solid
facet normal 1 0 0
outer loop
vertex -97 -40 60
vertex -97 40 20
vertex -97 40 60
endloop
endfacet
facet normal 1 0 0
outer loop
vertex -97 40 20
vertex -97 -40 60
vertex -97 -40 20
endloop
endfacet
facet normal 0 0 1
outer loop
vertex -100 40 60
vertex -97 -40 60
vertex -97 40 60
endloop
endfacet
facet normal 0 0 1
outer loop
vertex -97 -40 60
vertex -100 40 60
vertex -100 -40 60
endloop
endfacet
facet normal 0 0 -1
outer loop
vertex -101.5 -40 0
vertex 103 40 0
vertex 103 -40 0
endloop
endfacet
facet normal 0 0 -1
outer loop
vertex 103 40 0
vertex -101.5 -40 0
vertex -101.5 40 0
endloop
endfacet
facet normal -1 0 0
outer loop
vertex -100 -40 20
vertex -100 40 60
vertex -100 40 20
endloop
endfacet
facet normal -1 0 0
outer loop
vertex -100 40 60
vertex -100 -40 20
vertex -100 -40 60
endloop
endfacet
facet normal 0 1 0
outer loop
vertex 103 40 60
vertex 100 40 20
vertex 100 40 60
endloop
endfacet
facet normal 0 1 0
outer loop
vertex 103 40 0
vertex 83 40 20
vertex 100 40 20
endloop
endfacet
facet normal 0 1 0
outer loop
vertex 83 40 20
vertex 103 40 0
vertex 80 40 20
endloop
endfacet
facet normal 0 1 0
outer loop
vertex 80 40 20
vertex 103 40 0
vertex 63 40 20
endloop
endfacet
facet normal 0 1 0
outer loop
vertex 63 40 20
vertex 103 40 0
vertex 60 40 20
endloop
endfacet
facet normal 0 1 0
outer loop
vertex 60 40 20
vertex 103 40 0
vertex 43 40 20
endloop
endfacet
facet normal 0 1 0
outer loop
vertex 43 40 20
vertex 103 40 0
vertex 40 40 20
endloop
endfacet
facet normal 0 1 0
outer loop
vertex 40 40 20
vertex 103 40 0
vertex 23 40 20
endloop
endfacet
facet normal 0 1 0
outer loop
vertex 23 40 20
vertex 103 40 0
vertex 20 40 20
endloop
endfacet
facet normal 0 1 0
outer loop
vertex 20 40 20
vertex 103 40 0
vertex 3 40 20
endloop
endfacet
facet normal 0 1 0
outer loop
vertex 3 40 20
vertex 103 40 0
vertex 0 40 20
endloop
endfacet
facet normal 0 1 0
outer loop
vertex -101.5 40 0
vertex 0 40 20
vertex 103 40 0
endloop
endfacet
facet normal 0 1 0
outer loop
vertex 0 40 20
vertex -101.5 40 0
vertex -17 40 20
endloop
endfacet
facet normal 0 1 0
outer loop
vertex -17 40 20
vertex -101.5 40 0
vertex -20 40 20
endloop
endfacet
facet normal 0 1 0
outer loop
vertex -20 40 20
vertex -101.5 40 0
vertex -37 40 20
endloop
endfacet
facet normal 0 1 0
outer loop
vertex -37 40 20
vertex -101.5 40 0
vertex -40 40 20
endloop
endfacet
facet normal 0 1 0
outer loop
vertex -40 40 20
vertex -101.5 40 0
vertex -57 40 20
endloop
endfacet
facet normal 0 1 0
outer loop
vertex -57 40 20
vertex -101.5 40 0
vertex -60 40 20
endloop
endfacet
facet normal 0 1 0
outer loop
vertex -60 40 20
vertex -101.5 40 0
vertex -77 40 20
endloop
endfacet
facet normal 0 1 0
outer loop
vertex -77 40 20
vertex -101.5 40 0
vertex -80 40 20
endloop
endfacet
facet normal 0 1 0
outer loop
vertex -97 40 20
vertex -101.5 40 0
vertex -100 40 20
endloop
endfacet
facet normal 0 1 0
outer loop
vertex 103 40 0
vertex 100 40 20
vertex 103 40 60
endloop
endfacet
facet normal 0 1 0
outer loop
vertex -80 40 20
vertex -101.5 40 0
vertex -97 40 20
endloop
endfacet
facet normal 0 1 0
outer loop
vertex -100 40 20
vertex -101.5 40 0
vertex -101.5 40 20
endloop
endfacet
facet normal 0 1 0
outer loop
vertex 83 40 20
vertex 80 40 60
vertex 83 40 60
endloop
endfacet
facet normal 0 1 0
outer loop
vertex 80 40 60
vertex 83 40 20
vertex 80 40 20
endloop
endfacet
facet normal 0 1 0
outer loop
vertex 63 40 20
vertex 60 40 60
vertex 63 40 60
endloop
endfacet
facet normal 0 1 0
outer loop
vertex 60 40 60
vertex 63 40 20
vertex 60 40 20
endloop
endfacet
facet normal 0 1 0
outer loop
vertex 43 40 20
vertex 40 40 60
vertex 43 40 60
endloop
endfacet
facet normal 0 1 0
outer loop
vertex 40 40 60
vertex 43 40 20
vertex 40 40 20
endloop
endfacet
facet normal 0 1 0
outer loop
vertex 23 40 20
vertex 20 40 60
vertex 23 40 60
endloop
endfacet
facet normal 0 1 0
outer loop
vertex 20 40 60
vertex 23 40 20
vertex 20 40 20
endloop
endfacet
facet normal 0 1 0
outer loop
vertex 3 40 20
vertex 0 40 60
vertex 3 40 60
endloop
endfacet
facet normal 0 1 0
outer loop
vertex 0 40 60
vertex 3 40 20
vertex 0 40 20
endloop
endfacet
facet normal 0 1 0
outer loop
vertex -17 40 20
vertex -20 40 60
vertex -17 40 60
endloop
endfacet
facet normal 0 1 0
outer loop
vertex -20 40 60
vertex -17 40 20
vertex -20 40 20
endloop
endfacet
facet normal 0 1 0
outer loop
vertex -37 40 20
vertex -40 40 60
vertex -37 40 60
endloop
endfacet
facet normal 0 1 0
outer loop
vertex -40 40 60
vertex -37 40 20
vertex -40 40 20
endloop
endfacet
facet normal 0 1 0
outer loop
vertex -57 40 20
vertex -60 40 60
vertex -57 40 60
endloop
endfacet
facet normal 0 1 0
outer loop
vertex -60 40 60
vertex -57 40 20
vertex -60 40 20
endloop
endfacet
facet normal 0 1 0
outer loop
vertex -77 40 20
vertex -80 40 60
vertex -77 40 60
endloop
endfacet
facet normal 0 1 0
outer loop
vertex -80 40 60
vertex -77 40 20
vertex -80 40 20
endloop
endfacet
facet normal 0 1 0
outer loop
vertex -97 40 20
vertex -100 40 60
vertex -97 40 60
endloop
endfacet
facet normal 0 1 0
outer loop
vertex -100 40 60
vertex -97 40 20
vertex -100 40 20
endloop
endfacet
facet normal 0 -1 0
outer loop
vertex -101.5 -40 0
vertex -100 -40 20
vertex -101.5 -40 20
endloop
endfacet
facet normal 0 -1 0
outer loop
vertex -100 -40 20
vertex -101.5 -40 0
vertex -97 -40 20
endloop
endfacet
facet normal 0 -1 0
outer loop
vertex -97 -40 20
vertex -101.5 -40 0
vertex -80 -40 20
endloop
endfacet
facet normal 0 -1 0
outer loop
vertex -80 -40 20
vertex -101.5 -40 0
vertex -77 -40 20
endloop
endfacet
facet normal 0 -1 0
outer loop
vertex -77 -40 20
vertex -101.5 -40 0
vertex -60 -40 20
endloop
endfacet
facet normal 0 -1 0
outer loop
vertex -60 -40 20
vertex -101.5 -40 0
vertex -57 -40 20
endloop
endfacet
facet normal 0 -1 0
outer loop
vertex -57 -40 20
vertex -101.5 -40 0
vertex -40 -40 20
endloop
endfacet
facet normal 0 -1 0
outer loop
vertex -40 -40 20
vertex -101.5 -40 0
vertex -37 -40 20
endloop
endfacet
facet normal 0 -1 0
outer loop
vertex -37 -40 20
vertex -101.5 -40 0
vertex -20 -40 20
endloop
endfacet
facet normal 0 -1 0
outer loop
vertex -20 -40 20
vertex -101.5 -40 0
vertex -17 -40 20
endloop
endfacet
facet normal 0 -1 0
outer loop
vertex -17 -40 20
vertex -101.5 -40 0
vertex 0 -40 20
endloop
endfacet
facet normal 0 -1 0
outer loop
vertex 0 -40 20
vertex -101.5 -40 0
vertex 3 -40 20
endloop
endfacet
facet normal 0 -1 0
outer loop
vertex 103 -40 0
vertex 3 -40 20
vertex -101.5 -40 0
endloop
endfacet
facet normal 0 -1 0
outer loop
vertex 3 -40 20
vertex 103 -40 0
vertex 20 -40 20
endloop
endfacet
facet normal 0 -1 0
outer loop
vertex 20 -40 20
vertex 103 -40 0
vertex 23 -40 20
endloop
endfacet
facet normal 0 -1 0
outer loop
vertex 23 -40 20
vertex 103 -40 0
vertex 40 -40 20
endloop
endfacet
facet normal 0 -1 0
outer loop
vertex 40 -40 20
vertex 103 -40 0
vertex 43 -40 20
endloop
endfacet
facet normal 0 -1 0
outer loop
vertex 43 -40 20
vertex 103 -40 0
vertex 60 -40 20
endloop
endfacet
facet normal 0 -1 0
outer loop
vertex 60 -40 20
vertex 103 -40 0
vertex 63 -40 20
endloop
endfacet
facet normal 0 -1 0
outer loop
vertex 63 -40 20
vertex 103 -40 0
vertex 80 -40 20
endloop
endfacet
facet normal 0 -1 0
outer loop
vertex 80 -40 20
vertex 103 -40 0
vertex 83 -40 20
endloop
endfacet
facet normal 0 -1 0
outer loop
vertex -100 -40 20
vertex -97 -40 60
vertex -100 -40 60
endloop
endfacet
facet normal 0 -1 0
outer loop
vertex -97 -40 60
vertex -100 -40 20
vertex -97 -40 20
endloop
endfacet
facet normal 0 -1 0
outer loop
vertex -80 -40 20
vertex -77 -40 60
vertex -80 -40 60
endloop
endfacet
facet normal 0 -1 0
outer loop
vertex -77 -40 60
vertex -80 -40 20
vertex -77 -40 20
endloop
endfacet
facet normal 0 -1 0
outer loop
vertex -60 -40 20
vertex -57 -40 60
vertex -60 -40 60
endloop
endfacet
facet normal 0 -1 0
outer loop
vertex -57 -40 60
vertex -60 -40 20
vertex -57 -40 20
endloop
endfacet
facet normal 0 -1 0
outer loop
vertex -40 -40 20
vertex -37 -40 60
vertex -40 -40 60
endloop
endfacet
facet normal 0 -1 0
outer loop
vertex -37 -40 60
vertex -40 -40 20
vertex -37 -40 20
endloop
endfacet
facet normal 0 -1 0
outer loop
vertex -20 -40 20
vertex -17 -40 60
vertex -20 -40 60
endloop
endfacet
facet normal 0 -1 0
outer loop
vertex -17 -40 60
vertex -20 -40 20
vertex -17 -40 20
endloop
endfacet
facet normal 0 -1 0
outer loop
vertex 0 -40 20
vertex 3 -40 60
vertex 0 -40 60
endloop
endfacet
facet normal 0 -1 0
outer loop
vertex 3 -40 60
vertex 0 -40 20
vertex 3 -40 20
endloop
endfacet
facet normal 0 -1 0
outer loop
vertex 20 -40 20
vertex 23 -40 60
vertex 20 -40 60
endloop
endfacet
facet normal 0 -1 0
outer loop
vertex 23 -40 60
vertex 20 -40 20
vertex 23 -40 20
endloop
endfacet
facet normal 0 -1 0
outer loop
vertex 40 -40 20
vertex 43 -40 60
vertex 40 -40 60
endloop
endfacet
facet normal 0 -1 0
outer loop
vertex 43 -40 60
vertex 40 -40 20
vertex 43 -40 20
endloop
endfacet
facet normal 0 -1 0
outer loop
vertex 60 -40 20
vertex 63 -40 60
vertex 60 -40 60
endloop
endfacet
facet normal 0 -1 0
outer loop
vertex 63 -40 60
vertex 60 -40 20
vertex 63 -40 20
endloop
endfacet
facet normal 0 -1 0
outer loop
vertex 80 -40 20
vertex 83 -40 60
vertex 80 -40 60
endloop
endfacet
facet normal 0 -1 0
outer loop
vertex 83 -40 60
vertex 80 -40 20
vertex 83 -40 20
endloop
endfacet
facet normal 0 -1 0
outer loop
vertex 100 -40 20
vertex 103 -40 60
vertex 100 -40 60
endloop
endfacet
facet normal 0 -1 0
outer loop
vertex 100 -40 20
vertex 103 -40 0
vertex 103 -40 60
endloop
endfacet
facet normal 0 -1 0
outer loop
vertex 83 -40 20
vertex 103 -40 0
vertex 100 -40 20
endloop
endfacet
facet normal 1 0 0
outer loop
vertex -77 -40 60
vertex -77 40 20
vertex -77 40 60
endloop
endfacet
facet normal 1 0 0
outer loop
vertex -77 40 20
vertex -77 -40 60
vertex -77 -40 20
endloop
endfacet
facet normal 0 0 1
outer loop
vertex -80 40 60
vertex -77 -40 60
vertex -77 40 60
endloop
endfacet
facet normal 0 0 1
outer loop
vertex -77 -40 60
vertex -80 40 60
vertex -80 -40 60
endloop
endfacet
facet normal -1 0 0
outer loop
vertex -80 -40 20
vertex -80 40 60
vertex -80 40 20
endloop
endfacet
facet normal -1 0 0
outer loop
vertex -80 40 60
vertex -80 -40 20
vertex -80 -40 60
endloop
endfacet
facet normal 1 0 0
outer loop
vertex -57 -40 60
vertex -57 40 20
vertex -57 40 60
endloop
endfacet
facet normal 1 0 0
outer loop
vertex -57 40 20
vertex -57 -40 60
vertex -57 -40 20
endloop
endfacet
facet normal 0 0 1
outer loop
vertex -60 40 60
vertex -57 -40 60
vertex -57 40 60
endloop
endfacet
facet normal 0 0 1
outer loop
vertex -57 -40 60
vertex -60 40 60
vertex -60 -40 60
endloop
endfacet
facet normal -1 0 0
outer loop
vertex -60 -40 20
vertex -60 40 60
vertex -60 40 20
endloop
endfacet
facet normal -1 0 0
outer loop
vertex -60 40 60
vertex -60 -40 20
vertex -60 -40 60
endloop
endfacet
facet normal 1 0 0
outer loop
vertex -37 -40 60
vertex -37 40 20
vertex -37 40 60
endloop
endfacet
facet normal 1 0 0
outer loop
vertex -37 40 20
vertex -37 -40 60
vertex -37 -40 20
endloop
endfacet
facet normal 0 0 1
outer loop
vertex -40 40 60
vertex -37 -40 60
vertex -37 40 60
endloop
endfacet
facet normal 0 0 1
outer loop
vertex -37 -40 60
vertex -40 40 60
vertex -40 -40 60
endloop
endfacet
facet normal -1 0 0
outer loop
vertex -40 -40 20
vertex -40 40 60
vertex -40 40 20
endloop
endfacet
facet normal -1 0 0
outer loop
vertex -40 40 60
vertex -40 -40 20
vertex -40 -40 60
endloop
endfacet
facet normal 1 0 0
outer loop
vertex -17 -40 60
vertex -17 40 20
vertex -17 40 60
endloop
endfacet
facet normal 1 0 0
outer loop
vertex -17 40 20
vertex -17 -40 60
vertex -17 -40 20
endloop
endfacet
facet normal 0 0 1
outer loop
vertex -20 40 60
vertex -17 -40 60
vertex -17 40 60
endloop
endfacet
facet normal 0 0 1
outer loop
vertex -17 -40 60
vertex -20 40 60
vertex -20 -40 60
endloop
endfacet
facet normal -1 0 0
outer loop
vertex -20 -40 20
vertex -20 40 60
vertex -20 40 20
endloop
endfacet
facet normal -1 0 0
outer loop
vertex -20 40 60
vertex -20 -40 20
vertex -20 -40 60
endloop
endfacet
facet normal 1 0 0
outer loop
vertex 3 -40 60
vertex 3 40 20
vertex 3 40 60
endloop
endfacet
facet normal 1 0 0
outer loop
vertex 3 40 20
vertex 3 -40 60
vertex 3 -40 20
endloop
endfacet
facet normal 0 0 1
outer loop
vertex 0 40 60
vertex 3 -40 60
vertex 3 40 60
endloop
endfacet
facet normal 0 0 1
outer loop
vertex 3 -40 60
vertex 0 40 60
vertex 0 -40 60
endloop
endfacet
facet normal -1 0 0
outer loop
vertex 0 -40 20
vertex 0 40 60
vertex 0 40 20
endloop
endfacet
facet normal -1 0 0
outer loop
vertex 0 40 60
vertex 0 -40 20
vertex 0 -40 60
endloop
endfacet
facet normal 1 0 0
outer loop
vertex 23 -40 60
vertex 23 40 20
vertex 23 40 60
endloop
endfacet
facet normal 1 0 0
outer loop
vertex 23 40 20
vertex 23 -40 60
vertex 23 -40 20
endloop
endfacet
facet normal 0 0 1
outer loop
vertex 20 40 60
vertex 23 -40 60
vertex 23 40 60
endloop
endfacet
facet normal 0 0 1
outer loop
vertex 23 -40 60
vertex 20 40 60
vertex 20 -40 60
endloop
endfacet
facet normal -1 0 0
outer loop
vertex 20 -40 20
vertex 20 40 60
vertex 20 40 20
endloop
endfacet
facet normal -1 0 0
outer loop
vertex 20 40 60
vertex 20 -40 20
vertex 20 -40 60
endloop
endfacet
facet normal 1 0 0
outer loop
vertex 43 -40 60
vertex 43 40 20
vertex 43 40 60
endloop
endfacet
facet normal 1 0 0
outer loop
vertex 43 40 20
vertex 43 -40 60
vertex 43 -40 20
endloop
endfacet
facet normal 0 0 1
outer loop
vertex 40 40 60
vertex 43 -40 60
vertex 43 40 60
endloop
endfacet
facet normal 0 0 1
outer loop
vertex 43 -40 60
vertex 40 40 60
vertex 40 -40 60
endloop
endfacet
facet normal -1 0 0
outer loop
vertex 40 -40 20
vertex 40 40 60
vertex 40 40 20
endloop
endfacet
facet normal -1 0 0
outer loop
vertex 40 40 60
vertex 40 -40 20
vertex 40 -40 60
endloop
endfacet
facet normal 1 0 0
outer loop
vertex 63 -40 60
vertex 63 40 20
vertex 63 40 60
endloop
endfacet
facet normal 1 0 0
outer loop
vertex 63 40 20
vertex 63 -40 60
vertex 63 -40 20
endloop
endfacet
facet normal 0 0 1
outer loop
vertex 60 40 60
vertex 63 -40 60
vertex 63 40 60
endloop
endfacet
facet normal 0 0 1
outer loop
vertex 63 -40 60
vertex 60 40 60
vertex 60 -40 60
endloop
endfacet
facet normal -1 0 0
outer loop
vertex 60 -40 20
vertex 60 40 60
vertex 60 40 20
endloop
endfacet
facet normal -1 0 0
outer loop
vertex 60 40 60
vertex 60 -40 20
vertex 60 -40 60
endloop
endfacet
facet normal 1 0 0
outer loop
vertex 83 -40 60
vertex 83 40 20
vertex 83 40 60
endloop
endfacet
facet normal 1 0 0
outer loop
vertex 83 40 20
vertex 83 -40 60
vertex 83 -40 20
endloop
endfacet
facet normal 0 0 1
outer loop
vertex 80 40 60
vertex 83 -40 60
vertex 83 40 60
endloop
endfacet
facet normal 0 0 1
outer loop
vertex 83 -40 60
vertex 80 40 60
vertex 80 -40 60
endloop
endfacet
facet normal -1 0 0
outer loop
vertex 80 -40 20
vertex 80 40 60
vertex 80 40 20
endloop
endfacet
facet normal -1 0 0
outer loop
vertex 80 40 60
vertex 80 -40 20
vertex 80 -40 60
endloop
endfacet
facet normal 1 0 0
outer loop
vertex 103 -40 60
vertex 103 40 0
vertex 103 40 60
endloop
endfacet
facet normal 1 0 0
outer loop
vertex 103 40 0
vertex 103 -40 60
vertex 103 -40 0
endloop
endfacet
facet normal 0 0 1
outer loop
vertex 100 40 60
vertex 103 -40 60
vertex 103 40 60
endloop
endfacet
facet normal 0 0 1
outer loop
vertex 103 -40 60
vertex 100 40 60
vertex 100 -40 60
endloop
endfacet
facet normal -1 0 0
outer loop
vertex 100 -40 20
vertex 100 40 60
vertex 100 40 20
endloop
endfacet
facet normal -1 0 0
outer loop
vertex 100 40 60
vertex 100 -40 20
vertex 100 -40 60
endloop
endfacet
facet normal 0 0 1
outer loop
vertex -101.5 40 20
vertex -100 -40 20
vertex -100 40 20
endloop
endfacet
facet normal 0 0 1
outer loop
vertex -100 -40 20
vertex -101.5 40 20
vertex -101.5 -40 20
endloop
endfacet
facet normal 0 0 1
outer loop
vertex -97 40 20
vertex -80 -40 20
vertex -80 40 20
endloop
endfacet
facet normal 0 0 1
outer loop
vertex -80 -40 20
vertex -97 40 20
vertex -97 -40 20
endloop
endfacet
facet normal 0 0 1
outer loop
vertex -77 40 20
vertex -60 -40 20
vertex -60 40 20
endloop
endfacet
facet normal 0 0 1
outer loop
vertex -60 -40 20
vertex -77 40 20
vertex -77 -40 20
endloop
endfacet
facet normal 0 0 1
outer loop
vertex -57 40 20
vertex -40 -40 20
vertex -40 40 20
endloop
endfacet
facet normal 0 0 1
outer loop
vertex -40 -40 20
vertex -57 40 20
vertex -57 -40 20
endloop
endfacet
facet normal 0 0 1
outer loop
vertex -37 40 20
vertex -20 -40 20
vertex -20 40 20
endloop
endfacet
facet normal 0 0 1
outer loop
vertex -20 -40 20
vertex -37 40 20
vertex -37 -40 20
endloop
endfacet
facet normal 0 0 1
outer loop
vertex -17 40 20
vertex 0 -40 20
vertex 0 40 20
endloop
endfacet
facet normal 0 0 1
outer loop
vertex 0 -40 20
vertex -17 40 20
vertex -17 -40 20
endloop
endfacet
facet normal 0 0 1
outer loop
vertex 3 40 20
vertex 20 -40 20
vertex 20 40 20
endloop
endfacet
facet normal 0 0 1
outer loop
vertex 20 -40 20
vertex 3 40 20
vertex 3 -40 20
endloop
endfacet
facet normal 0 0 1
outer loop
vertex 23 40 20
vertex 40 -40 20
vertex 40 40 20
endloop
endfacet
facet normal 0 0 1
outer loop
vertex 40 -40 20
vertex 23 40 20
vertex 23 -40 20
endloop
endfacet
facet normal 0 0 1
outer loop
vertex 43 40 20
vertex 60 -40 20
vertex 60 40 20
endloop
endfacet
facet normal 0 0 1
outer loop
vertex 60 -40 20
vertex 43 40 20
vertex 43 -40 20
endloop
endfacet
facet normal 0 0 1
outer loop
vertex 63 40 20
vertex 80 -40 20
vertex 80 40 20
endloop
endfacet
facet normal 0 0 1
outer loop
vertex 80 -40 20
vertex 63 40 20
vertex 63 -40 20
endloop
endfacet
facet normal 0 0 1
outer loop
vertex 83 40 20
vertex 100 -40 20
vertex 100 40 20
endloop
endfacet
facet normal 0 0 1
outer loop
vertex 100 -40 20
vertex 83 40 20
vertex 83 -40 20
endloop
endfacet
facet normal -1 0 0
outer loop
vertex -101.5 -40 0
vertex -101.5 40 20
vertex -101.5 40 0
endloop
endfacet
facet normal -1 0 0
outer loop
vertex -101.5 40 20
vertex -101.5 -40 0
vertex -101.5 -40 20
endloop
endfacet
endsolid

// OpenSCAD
// Petri Dish Rack
// Designed for 90mm diameter dishes standing on edge.

// --- Dimensions ---
base_l      = 203;    // Length of base (X)
base_w      = 80;     // Width of base (Y)
base_h      = 20;     // Height of base (Z)

dish_radius = 45;     // Radius of 90mm dish
cradle_r    = 46;     // Radius of the cradle cut
cradle_z    = 52;     // Z-coordinate of the cradle cylinder axis
cradle_bottom = cradle_z - cradle_r; // Should be 6mm

num_dividers = 11;    // Number of divider plates
divider_t    = 3;     // Thickness of dividers (X)
divider_h    = 60;     // Height of dividers (Z)
divider_spacing = 20; // Distance between divider centers (X)

$fn = 128;

// --- Geometry Construction ---

// The base block
module base() {
    translate([-base_l/2, -base_w/2, 0])
        cube([base_l, base_w, base_h]);
}

// The divider plates
module dividers() {
    // Dividers are placed at x = -100, -80, ..., 100
    // Formula for center: (i - (n-1)/2) * spacing
    for (i = [0 : num_dividers - 1]) {
        x_pos = (i - (num_dividers - 1) / 2) * divider_spacing;
        translate([x_pos, -base_w/2, 0])
            cube([divider_t, base_w, divider_h]);
    }
}

// The cradle cut (cylindrical groove)
// The axis runs along X, at y=0, z=52.
// To use rotate_extrude, we create a 2D profile and rotate it.
// However, since the axis is parallel to X, we use a cylinder and rotate it.
module cradle_cut() {
    // We rotate a cylinder 90 degrees around Y to align axis with X
    // The cylinder is centered at y=0, z=52.
    // To make it a "cut", we use difference.
    // We need the cylinder to be long enough to cover the whole base.
    translate([0, 0, cradle_z])
        rotate([0, 90, 0])
            cylinder(h = base_l + 2, r = cradle_r);
}

// --- Final Assembly ---

union() {
    // The base and dividers form the solid structure
    difference() {
        union() {
            base();
            dividers();
        }
        
        // Subtract the cradle from the base and dividers
        // Note: The prompt says "the cradle is not cut through them" 
        // regarding the dividers, but "A curved cradle... is cut along its whole length".
        // Interpreting "the cradle is not cut through them" as: 
        // The cradle cut only applies to the base block, not the dividers.
        // Wait, re-reading: "Eleven solid divider plates... rise from z=0 to z=60... 
        // the cradle is not cut through them."
        // This means the cradle only affects the base.
        
        // To implement "cradle is not cut through them", we only subtract 
        // the cradle from the base block.
        
        // However, the prompt says "A curved cradle... is cut along its whole length".
        // This usually implies the groove is a feature of the rack.
        // If the cradle is NOT cut through the dividers, the dividers remain 
        // solid vertical slabs.
        
        // Let's follow the instruction: "the cradle is not cut through them [the dividers]".
        // This means we subtract the cradle from the base only.
        
        // To do this cleanly, we define the base and dividers separately.
    }
}

// Corrected Assembly Logic based on "cradle is not cut through them":
// 1. Create Base.
// 2. Subtract cradle from Base.
// 3. Add Dividers.

difference() {
    // Base with cradle cut
    difference() {
        base();
        // The cradle cut (only applied to the base)
        // We use a large cylinder to ensure it cuts through the base
        translate([0, 0, cradle_z])
            rotate([0, 90, 0])
                cylinder(h = base_l + 2, r = cradle_r);
    }
    
    // We don't subtract anything else from the base.
}

// Now add the dividers on top/around
// Since the dividers are "solid" and "rise from z=0 to z=60", 
// and the cradle is "not cut through them", the dividers 
// must be placed such that they are not affected by the cradle.
// But the dividers are at x = -100 to 100, which is the whole base.
// If the cradle is at z=6 to z=88 (approx), and dividers go from 0 to 60,
// they MUST intersect the cradle unless the cradle is only in the gaps.
// Re-reading: "This leaves ten 17 mm wide slots, one dish in each."
// This implies the dividers are the walls and the cradle is the floor of the slot.
// If the cradle is NOT cut through the dividers, the dividers are 
// continuous vertical plates from z=0 to z=60.

// Let's re-assemble:
// Final Part = (Base - Cradle) + Dividers
// But wait, if the dividers are solid from z=0 to 60, and the cradle is at z=6,
// the dividers would "fill in" the cradle.
// The only way "the cradle is not cut through them" makes sense is if 
// the dividers are placed in the gaps and the cradle is only the floor.
// But the prompt says "Eleven solid divider plates... rise from z=0 to z=60".
// This means the dividers are continuous.
// If the dividers are continuous, and the cradle is not cut through them,
// then the cradle only exists in the spaces between the dividers.

// Let's refine:
// 1. Base (203x80x20)
// 2. Dividers (11 plates, 3mm thick, 80mm wide, 60mm tall)
// 3. Cradle (The groove)

// If the cradle is NOT cut through the dividers, the cradle is a series 
// of disconnected arcs.

// Let's try this construction:
// Union of (Base - Cradle) and (Dividers).
// To make the cradle "not cut through them", we must subtract the cradle 
// from the base, but we must NOT subtract it from the dividers.

// Wait, if I subtract the cradle from the base, and then add the dividers,
// the dividers will "cover" the parts of the cradle they intersect.
// This results in the dividers being solid and the cradle being the floor 
// in the gaps. This matches "the cradle is not cut through them".

union() {
    // The Base with the cradle cut out
    difference() {
        base();
        // The cradle cut
        translate([0, 0, cradle_z])
            rotate([0, 90, 0])
                cylinder(h = base_l + 2, r = cradle_r);
    }
    
    // The Dividers
    dividers();
}

// Final check of the math:
// Dividers at x = -100, -80, -60, -40, -20, 0, 20, 40, 60, 80, 100.
// Total 11 dividers.
// Gaps between dividers: 20mm (center to center) - 3mm (thickness) = 17mm.
// This matches "ten 17 mm wide slots".
// Base is 203mm long. Dividers are at +/- 100. 
// The dividers are within the base length.
// The cradle is at z=52 with radius 46. 
// Bottom of cradle = 52 - 46 = 6mm.
// Base is 20mm tall. So the cradle cuts into the base from z=6 to z=20.
// The dividers are 60mm tall. They will cover the cradle where they intersect.
// This matches the description perfectly.
